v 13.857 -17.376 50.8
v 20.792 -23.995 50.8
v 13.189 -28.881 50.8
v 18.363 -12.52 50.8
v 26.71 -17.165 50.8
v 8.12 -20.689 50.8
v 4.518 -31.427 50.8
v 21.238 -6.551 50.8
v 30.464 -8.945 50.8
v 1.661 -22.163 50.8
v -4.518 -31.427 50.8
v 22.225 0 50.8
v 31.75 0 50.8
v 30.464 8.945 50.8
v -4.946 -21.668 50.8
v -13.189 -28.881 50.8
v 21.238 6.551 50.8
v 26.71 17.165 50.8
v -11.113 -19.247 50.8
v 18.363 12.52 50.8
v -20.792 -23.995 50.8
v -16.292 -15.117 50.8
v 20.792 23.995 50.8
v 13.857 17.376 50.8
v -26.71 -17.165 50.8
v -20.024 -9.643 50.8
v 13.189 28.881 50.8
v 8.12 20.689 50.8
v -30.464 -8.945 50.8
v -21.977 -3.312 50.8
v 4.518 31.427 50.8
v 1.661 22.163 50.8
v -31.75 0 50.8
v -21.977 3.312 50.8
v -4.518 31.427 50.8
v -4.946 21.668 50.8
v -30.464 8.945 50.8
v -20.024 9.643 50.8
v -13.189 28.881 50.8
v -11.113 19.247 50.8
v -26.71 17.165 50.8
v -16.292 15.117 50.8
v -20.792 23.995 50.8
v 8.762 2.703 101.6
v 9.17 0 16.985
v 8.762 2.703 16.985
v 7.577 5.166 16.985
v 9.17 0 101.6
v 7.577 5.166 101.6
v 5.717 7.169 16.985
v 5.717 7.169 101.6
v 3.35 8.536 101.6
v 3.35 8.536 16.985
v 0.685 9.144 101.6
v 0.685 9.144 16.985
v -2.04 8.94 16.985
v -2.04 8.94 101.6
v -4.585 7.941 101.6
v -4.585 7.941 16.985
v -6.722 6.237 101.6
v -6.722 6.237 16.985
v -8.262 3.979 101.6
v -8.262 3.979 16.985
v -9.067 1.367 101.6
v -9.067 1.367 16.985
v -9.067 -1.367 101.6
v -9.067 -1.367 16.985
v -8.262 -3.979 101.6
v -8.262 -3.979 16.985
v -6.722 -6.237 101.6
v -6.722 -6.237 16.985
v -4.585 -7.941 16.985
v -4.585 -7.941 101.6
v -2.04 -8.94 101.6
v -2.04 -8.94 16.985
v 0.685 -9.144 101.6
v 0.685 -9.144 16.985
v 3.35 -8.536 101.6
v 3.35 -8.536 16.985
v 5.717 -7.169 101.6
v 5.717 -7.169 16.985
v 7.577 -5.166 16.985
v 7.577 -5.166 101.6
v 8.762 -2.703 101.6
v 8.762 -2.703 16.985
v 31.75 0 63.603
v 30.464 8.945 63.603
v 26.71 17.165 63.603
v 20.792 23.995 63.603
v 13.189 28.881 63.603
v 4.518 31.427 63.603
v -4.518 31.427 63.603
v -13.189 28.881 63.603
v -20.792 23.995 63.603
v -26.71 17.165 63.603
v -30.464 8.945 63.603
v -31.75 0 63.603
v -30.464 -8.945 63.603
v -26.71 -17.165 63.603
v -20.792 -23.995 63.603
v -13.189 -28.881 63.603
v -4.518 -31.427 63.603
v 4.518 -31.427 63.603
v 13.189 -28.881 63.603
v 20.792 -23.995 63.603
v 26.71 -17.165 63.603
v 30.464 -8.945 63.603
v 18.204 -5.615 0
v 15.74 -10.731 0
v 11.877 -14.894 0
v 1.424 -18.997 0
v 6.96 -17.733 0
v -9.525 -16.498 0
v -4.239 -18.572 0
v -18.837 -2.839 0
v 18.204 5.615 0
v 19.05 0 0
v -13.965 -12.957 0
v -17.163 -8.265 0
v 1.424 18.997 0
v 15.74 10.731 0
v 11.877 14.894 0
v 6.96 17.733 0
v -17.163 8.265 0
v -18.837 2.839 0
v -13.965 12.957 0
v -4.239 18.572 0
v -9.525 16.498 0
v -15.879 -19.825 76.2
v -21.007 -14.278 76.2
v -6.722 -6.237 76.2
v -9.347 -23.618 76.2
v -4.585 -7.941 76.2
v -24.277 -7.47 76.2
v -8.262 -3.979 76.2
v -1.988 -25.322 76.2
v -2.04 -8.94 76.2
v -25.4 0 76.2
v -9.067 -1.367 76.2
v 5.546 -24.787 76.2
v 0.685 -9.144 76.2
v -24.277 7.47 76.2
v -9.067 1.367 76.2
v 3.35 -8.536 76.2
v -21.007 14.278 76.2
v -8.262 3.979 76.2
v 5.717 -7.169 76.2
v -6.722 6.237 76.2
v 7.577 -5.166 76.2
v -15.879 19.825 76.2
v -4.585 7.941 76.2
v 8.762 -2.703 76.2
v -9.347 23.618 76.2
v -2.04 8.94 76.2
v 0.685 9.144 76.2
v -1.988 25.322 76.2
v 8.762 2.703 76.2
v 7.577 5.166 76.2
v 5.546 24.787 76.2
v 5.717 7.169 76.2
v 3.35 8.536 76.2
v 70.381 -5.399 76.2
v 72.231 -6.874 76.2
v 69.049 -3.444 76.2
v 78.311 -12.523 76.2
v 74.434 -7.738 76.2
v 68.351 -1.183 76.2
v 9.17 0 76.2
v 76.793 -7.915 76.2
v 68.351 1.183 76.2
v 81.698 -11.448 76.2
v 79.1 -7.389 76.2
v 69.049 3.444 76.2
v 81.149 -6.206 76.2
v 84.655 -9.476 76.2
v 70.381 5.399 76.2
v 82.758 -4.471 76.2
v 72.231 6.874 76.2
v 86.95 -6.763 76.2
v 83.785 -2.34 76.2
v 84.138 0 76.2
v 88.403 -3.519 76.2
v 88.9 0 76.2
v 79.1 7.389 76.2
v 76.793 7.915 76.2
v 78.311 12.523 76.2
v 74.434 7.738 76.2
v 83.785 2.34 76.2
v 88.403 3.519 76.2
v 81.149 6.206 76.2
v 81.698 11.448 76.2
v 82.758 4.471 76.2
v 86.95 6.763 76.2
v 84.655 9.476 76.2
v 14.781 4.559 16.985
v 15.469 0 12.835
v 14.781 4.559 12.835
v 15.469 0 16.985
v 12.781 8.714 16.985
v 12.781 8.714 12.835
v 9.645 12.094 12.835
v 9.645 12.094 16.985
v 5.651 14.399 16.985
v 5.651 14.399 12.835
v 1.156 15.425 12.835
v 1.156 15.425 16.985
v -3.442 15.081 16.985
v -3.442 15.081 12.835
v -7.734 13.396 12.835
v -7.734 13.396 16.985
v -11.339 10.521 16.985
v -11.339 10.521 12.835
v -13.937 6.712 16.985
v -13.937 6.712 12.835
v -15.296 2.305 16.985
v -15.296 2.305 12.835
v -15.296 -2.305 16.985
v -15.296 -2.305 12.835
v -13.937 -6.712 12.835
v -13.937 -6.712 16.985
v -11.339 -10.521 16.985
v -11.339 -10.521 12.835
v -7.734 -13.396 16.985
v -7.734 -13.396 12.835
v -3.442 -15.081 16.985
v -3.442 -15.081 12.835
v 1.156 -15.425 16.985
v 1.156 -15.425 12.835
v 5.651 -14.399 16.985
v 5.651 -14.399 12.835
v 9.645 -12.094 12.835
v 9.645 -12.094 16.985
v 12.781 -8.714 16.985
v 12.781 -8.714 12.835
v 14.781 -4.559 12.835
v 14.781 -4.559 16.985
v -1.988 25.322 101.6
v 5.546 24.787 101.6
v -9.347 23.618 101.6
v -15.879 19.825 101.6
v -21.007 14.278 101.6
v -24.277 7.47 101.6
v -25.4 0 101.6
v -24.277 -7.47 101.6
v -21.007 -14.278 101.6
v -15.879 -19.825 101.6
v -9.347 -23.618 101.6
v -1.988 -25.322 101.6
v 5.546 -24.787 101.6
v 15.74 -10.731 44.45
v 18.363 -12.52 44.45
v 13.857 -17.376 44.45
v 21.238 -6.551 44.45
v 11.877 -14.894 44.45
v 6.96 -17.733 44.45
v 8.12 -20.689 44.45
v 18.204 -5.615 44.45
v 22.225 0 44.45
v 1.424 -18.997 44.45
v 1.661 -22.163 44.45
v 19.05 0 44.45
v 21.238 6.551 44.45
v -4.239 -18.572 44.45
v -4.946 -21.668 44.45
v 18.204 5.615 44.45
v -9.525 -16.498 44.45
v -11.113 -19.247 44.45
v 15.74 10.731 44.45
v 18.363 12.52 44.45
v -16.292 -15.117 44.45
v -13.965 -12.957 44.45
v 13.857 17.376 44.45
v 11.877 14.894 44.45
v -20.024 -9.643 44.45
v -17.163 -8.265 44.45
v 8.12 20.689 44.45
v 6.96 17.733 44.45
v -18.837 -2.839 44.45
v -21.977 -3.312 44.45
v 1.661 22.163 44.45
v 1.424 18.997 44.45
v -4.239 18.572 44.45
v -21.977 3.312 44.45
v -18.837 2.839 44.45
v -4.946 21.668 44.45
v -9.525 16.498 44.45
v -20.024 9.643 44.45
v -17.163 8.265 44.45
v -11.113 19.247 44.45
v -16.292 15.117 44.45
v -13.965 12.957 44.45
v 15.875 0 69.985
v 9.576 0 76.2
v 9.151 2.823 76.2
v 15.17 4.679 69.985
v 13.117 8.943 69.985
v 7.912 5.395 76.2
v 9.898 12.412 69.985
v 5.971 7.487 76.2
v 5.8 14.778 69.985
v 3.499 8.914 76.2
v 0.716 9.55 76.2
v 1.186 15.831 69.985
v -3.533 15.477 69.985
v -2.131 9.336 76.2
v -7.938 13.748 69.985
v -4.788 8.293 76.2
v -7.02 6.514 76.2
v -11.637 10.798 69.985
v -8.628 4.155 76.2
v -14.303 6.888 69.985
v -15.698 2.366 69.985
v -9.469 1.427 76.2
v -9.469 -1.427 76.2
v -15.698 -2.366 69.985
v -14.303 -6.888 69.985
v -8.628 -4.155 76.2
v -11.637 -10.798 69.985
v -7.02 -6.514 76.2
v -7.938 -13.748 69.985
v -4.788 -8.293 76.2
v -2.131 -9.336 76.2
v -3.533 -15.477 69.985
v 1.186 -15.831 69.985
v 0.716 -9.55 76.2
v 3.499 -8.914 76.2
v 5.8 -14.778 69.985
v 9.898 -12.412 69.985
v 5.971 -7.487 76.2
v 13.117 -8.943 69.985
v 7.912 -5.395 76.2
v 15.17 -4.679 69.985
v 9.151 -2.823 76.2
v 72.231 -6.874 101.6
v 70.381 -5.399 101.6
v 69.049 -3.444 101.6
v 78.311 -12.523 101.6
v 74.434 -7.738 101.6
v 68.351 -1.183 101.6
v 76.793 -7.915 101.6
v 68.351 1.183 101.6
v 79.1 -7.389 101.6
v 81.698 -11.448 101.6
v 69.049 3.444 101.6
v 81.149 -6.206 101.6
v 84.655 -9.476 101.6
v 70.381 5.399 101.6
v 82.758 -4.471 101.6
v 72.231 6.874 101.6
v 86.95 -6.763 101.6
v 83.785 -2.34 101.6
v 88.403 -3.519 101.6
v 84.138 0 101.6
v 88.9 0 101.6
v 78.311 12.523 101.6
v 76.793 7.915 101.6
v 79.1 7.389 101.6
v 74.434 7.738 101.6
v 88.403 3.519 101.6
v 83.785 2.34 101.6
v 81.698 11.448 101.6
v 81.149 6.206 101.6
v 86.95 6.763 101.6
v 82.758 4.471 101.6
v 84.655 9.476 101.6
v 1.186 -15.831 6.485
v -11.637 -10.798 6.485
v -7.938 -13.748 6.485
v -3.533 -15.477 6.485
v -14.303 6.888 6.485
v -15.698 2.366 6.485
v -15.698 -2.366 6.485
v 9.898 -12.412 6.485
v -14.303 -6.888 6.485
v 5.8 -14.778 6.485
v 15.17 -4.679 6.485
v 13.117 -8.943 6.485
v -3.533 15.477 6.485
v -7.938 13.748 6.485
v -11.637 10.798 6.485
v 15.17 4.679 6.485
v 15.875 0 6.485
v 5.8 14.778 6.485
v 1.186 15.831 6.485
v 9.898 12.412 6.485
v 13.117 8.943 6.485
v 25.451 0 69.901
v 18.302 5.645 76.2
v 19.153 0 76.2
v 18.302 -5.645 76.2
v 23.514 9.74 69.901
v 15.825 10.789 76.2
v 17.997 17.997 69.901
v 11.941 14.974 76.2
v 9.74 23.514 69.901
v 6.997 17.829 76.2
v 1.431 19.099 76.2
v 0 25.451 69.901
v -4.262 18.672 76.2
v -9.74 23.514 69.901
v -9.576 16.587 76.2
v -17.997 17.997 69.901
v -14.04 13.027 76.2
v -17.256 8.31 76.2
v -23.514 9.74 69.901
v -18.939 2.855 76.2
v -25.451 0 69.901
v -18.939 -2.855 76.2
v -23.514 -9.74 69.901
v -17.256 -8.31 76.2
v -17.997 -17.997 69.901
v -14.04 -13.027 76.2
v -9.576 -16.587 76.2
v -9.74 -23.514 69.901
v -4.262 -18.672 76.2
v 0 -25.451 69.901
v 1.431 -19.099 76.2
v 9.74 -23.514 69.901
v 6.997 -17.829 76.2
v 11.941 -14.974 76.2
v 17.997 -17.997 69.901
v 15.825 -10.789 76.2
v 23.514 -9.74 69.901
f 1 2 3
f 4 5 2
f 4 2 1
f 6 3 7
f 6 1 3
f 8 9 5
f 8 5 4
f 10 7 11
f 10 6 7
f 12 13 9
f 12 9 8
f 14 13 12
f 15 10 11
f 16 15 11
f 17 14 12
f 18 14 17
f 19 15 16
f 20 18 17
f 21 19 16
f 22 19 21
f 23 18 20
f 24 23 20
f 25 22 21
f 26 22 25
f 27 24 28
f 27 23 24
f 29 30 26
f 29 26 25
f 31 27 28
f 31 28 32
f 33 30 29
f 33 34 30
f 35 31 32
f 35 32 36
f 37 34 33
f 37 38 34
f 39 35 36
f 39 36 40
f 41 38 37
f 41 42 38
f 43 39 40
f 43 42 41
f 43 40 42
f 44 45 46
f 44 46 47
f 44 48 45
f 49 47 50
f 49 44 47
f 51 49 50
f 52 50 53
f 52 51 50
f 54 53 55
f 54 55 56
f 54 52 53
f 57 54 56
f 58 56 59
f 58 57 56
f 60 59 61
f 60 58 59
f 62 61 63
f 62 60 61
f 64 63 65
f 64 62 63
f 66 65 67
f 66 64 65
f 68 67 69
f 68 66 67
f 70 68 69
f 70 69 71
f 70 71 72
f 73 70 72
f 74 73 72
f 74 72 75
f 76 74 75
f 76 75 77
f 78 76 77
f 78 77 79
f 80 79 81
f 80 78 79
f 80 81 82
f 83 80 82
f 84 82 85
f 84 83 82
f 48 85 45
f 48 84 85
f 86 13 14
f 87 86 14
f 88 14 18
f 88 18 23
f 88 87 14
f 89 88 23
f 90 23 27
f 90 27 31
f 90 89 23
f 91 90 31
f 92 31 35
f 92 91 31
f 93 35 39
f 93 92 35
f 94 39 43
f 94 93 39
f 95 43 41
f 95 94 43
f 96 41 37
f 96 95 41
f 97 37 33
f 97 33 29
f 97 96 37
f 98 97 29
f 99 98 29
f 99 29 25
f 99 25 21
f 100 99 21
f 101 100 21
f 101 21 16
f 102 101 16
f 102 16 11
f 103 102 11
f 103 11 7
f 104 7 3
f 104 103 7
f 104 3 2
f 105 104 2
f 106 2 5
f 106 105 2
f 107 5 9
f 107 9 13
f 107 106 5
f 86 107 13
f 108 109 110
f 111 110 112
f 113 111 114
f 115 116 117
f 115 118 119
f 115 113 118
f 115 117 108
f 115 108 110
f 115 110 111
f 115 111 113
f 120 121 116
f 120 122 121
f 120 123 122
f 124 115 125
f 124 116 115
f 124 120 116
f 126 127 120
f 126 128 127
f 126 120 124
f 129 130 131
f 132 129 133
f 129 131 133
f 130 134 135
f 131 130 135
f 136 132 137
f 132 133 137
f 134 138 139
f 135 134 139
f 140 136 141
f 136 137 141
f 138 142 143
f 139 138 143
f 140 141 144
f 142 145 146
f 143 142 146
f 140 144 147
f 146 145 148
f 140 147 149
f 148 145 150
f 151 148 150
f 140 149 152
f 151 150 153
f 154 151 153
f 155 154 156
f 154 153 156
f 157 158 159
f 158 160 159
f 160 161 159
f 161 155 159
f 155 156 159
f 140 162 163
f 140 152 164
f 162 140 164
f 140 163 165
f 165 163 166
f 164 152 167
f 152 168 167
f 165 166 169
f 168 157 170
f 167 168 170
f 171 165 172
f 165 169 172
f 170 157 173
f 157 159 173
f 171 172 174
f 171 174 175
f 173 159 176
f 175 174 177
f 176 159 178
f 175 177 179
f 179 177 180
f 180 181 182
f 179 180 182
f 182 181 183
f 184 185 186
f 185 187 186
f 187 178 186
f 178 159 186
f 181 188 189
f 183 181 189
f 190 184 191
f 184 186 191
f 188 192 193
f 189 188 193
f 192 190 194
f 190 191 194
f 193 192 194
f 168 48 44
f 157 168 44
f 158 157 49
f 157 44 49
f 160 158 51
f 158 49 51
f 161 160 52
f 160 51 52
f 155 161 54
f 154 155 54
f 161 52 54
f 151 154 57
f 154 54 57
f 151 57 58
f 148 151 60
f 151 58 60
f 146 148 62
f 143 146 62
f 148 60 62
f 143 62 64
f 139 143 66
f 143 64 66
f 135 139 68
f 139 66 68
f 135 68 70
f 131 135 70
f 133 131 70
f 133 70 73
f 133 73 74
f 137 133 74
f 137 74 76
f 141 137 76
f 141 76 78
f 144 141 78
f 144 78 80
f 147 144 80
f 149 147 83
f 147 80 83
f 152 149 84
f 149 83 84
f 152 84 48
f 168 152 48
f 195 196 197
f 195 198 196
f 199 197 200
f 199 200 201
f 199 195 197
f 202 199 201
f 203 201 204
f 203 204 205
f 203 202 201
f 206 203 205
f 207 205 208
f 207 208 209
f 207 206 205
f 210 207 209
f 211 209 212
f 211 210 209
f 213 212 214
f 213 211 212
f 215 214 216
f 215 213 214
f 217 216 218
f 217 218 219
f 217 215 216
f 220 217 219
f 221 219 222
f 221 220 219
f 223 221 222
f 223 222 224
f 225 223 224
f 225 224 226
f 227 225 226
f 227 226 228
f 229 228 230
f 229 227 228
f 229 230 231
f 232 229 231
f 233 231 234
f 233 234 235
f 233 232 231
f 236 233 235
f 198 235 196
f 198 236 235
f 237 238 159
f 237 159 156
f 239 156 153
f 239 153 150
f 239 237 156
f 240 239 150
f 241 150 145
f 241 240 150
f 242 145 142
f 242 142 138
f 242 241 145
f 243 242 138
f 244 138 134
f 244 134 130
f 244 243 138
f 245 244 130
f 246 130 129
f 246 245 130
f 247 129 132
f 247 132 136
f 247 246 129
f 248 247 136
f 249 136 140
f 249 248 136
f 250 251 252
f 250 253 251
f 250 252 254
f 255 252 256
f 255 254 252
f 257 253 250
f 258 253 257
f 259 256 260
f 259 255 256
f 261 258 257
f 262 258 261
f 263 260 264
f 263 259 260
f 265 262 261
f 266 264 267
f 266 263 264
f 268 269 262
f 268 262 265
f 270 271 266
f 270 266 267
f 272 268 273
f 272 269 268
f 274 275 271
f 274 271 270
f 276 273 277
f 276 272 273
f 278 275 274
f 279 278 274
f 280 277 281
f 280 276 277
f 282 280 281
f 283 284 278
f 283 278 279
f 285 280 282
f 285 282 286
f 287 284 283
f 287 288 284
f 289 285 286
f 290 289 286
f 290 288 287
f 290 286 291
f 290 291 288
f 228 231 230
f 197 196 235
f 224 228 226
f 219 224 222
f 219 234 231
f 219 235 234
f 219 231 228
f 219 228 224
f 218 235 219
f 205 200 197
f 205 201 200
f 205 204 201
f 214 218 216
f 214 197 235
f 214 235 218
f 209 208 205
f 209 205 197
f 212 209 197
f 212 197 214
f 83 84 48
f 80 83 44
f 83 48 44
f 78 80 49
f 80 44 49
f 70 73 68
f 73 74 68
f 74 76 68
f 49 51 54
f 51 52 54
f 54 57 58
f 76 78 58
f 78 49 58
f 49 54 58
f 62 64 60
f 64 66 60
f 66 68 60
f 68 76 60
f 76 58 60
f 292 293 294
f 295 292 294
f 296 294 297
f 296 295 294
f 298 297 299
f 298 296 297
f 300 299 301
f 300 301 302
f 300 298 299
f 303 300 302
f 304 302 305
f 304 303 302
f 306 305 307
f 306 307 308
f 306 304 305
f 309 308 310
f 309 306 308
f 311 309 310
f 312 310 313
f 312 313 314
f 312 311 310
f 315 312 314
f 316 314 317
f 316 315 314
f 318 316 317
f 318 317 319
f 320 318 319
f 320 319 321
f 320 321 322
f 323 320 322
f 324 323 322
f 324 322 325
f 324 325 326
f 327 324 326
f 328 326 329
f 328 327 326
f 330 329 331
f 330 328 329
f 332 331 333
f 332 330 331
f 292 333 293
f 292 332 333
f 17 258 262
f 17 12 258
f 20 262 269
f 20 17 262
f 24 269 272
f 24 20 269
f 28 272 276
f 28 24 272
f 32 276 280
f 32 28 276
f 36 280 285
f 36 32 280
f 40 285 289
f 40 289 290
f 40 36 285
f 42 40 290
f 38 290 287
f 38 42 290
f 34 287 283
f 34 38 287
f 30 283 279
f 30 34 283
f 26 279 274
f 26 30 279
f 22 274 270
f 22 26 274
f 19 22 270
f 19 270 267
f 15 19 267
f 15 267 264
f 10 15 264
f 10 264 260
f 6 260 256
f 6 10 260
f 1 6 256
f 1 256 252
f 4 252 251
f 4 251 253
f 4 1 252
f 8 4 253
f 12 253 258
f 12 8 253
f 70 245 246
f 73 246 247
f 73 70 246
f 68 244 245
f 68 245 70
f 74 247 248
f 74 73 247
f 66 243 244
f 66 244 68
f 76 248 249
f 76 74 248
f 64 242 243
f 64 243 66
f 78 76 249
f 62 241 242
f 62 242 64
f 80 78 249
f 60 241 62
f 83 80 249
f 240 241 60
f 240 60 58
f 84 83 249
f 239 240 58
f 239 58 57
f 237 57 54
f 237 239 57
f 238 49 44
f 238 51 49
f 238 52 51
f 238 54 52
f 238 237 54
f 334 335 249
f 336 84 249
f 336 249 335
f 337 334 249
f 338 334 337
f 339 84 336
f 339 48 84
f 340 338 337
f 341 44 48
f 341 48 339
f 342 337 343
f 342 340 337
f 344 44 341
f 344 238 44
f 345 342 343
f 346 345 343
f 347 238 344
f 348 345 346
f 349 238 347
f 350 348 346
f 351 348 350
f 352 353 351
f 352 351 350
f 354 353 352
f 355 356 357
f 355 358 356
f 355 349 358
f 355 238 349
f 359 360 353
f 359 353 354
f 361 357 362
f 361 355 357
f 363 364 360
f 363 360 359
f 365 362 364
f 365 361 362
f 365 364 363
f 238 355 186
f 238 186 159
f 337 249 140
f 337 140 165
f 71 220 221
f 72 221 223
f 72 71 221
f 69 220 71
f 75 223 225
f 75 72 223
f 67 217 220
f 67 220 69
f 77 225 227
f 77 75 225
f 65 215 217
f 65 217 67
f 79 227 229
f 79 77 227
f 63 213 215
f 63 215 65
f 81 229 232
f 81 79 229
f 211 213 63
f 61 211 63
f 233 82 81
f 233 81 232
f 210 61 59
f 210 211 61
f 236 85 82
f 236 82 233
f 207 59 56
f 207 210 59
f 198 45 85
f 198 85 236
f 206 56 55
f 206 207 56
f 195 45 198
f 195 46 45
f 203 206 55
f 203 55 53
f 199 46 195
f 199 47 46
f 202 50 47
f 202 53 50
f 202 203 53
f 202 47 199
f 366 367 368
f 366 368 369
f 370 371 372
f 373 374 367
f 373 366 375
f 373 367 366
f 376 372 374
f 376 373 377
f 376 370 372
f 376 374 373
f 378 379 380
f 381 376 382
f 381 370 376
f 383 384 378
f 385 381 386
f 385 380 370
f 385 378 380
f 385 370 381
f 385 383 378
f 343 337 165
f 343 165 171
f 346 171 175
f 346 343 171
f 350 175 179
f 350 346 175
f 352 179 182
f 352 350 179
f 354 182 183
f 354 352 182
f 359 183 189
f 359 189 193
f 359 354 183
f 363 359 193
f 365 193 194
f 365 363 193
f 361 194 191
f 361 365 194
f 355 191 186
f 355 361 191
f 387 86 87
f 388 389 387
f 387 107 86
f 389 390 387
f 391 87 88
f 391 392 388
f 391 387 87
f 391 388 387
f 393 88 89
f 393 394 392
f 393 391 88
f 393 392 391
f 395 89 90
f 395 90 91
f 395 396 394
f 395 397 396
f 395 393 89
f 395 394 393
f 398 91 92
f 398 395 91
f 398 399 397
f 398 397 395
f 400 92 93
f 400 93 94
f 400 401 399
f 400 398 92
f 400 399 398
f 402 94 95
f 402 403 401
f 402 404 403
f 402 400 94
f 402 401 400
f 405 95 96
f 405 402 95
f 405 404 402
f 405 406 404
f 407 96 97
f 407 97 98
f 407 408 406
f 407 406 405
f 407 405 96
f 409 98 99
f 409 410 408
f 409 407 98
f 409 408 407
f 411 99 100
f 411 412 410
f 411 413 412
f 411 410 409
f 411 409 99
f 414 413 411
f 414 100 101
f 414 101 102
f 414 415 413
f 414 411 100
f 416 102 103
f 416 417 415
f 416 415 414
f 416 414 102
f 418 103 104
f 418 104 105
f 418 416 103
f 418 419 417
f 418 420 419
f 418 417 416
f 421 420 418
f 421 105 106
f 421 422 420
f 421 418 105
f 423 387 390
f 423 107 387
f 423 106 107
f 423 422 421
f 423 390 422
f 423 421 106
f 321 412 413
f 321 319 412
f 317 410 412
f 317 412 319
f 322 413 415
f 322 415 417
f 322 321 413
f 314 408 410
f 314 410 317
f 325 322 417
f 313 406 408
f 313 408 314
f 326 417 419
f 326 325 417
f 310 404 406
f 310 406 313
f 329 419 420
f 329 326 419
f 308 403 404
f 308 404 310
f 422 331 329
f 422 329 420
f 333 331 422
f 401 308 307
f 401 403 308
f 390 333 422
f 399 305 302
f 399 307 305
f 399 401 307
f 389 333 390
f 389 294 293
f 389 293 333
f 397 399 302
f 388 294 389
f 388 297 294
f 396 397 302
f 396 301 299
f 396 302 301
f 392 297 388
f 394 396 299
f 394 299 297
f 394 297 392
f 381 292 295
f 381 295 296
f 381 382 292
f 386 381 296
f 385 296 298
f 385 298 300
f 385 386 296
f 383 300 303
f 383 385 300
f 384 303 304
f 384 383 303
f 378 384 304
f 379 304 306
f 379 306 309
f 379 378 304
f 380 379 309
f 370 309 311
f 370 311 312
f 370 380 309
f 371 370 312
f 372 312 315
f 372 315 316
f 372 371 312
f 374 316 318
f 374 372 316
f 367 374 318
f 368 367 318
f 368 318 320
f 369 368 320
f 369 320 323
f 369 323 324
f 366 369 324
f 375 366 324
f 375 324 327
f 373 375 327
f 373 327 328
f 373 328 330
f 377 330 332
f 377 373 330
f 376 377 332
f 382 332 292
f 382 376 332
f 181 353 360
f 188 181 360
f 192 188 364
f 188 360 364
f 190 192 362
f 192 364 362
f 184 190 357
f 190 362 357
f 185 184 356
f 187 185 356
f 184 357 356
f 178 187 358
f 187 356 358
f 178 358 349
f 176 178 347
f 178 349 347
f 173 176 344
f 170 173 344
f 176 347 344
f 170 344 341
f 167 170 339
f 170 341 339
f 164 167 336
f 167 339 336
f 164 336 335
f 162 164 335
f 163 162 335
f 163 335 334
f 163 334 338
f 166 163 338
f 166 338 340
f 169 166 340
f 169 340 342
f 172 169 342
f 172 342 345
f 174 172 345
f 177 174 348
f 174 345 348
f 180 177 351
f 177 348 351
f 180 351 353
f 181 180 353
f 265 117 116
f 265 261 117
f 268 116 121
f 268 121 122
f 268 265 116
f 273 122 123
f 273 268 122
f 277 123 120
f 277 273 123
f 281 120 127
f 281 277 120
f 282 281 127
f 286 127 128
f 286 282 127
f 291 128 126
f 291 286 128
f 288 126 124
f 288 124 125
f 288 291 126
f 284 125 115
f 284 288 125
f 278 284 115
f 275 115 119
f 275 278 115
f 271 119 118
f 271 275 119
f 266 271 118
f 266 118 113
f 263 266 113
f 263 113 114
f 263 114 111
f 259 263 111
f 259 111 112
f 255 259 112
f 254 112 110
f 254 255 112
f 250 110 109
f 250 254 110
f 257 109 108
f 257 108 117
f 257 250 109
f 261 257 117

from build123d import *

# Parameters (mm, degrees)
F0_W     = 9.169884
F0_H     = 25.4
F3_R     = 9.169884
F3_R_2   = 7.9375
F4_DEPTH = 25.4


with BuildPart() as f1:
    # F0 (on Front) → F1 (revolve)
    with BuildSketch(Plane.XZ):
        Polygon((19.152567, 76.2), (9.576284, 76.2), (15.875, 69.985268), (15.875, 6.485268), (0, 6.485268), (0, 0), (19.05, 0), (19.05, 44.450001), (22.225, 44.450001), (22.225, 50.800001), (31.75, 50.800001), (31.75, 63.602567), align=None)
    revolve(axis=Axis((0, 0, 82.310471), (0, 0, 1)))


with BuildPart() as f2:
    # F0 (on Front) → F2 (revolve)
    with BuildSketch(Plane.XZ):
        Polygon((9.169884, 16.984778), (9.169884, 76.2), (0, 76.2), (0, 12.835268), (15.4686, 12.835268), (15.4686, 16.984778), align=None)
        with Locations((4.584942, 88.9)):
            Rectangle(F0_W, F0_H)
    revolve(axis=Axis((0, 0, 104.282323), (0, 0, 1)))


with BuildPart() as f4:
    # F3 (on face) → F4 (new body, through all)
    with BuildSketch(Plane.XY.offset(101.6)):
        with BuildLine():
            Line((78.310685, 12.523378), (5.546418, 24.787038))
            ThreePointArc((5.546418, 24.787038), (-25.4, 0), (5.546418, -24.787038))
            Line((5.546418, -24.787038), (78.310685, -12.523378))
            ThreePointArc((78.310685, -12.523378), (88.9, 0), (78.310685, 12.523378))
        make_face()
        Circle(F3_R, mode=Mode.SUBTRACT)
        with Locations((76.2, 0)):
            Circle(F3_R_2, mode=Mode.SUBTRACT)
    extrude(amount=-F4_DEPTH)


solid = Compound([f1.part, f2.part, f4.part])
